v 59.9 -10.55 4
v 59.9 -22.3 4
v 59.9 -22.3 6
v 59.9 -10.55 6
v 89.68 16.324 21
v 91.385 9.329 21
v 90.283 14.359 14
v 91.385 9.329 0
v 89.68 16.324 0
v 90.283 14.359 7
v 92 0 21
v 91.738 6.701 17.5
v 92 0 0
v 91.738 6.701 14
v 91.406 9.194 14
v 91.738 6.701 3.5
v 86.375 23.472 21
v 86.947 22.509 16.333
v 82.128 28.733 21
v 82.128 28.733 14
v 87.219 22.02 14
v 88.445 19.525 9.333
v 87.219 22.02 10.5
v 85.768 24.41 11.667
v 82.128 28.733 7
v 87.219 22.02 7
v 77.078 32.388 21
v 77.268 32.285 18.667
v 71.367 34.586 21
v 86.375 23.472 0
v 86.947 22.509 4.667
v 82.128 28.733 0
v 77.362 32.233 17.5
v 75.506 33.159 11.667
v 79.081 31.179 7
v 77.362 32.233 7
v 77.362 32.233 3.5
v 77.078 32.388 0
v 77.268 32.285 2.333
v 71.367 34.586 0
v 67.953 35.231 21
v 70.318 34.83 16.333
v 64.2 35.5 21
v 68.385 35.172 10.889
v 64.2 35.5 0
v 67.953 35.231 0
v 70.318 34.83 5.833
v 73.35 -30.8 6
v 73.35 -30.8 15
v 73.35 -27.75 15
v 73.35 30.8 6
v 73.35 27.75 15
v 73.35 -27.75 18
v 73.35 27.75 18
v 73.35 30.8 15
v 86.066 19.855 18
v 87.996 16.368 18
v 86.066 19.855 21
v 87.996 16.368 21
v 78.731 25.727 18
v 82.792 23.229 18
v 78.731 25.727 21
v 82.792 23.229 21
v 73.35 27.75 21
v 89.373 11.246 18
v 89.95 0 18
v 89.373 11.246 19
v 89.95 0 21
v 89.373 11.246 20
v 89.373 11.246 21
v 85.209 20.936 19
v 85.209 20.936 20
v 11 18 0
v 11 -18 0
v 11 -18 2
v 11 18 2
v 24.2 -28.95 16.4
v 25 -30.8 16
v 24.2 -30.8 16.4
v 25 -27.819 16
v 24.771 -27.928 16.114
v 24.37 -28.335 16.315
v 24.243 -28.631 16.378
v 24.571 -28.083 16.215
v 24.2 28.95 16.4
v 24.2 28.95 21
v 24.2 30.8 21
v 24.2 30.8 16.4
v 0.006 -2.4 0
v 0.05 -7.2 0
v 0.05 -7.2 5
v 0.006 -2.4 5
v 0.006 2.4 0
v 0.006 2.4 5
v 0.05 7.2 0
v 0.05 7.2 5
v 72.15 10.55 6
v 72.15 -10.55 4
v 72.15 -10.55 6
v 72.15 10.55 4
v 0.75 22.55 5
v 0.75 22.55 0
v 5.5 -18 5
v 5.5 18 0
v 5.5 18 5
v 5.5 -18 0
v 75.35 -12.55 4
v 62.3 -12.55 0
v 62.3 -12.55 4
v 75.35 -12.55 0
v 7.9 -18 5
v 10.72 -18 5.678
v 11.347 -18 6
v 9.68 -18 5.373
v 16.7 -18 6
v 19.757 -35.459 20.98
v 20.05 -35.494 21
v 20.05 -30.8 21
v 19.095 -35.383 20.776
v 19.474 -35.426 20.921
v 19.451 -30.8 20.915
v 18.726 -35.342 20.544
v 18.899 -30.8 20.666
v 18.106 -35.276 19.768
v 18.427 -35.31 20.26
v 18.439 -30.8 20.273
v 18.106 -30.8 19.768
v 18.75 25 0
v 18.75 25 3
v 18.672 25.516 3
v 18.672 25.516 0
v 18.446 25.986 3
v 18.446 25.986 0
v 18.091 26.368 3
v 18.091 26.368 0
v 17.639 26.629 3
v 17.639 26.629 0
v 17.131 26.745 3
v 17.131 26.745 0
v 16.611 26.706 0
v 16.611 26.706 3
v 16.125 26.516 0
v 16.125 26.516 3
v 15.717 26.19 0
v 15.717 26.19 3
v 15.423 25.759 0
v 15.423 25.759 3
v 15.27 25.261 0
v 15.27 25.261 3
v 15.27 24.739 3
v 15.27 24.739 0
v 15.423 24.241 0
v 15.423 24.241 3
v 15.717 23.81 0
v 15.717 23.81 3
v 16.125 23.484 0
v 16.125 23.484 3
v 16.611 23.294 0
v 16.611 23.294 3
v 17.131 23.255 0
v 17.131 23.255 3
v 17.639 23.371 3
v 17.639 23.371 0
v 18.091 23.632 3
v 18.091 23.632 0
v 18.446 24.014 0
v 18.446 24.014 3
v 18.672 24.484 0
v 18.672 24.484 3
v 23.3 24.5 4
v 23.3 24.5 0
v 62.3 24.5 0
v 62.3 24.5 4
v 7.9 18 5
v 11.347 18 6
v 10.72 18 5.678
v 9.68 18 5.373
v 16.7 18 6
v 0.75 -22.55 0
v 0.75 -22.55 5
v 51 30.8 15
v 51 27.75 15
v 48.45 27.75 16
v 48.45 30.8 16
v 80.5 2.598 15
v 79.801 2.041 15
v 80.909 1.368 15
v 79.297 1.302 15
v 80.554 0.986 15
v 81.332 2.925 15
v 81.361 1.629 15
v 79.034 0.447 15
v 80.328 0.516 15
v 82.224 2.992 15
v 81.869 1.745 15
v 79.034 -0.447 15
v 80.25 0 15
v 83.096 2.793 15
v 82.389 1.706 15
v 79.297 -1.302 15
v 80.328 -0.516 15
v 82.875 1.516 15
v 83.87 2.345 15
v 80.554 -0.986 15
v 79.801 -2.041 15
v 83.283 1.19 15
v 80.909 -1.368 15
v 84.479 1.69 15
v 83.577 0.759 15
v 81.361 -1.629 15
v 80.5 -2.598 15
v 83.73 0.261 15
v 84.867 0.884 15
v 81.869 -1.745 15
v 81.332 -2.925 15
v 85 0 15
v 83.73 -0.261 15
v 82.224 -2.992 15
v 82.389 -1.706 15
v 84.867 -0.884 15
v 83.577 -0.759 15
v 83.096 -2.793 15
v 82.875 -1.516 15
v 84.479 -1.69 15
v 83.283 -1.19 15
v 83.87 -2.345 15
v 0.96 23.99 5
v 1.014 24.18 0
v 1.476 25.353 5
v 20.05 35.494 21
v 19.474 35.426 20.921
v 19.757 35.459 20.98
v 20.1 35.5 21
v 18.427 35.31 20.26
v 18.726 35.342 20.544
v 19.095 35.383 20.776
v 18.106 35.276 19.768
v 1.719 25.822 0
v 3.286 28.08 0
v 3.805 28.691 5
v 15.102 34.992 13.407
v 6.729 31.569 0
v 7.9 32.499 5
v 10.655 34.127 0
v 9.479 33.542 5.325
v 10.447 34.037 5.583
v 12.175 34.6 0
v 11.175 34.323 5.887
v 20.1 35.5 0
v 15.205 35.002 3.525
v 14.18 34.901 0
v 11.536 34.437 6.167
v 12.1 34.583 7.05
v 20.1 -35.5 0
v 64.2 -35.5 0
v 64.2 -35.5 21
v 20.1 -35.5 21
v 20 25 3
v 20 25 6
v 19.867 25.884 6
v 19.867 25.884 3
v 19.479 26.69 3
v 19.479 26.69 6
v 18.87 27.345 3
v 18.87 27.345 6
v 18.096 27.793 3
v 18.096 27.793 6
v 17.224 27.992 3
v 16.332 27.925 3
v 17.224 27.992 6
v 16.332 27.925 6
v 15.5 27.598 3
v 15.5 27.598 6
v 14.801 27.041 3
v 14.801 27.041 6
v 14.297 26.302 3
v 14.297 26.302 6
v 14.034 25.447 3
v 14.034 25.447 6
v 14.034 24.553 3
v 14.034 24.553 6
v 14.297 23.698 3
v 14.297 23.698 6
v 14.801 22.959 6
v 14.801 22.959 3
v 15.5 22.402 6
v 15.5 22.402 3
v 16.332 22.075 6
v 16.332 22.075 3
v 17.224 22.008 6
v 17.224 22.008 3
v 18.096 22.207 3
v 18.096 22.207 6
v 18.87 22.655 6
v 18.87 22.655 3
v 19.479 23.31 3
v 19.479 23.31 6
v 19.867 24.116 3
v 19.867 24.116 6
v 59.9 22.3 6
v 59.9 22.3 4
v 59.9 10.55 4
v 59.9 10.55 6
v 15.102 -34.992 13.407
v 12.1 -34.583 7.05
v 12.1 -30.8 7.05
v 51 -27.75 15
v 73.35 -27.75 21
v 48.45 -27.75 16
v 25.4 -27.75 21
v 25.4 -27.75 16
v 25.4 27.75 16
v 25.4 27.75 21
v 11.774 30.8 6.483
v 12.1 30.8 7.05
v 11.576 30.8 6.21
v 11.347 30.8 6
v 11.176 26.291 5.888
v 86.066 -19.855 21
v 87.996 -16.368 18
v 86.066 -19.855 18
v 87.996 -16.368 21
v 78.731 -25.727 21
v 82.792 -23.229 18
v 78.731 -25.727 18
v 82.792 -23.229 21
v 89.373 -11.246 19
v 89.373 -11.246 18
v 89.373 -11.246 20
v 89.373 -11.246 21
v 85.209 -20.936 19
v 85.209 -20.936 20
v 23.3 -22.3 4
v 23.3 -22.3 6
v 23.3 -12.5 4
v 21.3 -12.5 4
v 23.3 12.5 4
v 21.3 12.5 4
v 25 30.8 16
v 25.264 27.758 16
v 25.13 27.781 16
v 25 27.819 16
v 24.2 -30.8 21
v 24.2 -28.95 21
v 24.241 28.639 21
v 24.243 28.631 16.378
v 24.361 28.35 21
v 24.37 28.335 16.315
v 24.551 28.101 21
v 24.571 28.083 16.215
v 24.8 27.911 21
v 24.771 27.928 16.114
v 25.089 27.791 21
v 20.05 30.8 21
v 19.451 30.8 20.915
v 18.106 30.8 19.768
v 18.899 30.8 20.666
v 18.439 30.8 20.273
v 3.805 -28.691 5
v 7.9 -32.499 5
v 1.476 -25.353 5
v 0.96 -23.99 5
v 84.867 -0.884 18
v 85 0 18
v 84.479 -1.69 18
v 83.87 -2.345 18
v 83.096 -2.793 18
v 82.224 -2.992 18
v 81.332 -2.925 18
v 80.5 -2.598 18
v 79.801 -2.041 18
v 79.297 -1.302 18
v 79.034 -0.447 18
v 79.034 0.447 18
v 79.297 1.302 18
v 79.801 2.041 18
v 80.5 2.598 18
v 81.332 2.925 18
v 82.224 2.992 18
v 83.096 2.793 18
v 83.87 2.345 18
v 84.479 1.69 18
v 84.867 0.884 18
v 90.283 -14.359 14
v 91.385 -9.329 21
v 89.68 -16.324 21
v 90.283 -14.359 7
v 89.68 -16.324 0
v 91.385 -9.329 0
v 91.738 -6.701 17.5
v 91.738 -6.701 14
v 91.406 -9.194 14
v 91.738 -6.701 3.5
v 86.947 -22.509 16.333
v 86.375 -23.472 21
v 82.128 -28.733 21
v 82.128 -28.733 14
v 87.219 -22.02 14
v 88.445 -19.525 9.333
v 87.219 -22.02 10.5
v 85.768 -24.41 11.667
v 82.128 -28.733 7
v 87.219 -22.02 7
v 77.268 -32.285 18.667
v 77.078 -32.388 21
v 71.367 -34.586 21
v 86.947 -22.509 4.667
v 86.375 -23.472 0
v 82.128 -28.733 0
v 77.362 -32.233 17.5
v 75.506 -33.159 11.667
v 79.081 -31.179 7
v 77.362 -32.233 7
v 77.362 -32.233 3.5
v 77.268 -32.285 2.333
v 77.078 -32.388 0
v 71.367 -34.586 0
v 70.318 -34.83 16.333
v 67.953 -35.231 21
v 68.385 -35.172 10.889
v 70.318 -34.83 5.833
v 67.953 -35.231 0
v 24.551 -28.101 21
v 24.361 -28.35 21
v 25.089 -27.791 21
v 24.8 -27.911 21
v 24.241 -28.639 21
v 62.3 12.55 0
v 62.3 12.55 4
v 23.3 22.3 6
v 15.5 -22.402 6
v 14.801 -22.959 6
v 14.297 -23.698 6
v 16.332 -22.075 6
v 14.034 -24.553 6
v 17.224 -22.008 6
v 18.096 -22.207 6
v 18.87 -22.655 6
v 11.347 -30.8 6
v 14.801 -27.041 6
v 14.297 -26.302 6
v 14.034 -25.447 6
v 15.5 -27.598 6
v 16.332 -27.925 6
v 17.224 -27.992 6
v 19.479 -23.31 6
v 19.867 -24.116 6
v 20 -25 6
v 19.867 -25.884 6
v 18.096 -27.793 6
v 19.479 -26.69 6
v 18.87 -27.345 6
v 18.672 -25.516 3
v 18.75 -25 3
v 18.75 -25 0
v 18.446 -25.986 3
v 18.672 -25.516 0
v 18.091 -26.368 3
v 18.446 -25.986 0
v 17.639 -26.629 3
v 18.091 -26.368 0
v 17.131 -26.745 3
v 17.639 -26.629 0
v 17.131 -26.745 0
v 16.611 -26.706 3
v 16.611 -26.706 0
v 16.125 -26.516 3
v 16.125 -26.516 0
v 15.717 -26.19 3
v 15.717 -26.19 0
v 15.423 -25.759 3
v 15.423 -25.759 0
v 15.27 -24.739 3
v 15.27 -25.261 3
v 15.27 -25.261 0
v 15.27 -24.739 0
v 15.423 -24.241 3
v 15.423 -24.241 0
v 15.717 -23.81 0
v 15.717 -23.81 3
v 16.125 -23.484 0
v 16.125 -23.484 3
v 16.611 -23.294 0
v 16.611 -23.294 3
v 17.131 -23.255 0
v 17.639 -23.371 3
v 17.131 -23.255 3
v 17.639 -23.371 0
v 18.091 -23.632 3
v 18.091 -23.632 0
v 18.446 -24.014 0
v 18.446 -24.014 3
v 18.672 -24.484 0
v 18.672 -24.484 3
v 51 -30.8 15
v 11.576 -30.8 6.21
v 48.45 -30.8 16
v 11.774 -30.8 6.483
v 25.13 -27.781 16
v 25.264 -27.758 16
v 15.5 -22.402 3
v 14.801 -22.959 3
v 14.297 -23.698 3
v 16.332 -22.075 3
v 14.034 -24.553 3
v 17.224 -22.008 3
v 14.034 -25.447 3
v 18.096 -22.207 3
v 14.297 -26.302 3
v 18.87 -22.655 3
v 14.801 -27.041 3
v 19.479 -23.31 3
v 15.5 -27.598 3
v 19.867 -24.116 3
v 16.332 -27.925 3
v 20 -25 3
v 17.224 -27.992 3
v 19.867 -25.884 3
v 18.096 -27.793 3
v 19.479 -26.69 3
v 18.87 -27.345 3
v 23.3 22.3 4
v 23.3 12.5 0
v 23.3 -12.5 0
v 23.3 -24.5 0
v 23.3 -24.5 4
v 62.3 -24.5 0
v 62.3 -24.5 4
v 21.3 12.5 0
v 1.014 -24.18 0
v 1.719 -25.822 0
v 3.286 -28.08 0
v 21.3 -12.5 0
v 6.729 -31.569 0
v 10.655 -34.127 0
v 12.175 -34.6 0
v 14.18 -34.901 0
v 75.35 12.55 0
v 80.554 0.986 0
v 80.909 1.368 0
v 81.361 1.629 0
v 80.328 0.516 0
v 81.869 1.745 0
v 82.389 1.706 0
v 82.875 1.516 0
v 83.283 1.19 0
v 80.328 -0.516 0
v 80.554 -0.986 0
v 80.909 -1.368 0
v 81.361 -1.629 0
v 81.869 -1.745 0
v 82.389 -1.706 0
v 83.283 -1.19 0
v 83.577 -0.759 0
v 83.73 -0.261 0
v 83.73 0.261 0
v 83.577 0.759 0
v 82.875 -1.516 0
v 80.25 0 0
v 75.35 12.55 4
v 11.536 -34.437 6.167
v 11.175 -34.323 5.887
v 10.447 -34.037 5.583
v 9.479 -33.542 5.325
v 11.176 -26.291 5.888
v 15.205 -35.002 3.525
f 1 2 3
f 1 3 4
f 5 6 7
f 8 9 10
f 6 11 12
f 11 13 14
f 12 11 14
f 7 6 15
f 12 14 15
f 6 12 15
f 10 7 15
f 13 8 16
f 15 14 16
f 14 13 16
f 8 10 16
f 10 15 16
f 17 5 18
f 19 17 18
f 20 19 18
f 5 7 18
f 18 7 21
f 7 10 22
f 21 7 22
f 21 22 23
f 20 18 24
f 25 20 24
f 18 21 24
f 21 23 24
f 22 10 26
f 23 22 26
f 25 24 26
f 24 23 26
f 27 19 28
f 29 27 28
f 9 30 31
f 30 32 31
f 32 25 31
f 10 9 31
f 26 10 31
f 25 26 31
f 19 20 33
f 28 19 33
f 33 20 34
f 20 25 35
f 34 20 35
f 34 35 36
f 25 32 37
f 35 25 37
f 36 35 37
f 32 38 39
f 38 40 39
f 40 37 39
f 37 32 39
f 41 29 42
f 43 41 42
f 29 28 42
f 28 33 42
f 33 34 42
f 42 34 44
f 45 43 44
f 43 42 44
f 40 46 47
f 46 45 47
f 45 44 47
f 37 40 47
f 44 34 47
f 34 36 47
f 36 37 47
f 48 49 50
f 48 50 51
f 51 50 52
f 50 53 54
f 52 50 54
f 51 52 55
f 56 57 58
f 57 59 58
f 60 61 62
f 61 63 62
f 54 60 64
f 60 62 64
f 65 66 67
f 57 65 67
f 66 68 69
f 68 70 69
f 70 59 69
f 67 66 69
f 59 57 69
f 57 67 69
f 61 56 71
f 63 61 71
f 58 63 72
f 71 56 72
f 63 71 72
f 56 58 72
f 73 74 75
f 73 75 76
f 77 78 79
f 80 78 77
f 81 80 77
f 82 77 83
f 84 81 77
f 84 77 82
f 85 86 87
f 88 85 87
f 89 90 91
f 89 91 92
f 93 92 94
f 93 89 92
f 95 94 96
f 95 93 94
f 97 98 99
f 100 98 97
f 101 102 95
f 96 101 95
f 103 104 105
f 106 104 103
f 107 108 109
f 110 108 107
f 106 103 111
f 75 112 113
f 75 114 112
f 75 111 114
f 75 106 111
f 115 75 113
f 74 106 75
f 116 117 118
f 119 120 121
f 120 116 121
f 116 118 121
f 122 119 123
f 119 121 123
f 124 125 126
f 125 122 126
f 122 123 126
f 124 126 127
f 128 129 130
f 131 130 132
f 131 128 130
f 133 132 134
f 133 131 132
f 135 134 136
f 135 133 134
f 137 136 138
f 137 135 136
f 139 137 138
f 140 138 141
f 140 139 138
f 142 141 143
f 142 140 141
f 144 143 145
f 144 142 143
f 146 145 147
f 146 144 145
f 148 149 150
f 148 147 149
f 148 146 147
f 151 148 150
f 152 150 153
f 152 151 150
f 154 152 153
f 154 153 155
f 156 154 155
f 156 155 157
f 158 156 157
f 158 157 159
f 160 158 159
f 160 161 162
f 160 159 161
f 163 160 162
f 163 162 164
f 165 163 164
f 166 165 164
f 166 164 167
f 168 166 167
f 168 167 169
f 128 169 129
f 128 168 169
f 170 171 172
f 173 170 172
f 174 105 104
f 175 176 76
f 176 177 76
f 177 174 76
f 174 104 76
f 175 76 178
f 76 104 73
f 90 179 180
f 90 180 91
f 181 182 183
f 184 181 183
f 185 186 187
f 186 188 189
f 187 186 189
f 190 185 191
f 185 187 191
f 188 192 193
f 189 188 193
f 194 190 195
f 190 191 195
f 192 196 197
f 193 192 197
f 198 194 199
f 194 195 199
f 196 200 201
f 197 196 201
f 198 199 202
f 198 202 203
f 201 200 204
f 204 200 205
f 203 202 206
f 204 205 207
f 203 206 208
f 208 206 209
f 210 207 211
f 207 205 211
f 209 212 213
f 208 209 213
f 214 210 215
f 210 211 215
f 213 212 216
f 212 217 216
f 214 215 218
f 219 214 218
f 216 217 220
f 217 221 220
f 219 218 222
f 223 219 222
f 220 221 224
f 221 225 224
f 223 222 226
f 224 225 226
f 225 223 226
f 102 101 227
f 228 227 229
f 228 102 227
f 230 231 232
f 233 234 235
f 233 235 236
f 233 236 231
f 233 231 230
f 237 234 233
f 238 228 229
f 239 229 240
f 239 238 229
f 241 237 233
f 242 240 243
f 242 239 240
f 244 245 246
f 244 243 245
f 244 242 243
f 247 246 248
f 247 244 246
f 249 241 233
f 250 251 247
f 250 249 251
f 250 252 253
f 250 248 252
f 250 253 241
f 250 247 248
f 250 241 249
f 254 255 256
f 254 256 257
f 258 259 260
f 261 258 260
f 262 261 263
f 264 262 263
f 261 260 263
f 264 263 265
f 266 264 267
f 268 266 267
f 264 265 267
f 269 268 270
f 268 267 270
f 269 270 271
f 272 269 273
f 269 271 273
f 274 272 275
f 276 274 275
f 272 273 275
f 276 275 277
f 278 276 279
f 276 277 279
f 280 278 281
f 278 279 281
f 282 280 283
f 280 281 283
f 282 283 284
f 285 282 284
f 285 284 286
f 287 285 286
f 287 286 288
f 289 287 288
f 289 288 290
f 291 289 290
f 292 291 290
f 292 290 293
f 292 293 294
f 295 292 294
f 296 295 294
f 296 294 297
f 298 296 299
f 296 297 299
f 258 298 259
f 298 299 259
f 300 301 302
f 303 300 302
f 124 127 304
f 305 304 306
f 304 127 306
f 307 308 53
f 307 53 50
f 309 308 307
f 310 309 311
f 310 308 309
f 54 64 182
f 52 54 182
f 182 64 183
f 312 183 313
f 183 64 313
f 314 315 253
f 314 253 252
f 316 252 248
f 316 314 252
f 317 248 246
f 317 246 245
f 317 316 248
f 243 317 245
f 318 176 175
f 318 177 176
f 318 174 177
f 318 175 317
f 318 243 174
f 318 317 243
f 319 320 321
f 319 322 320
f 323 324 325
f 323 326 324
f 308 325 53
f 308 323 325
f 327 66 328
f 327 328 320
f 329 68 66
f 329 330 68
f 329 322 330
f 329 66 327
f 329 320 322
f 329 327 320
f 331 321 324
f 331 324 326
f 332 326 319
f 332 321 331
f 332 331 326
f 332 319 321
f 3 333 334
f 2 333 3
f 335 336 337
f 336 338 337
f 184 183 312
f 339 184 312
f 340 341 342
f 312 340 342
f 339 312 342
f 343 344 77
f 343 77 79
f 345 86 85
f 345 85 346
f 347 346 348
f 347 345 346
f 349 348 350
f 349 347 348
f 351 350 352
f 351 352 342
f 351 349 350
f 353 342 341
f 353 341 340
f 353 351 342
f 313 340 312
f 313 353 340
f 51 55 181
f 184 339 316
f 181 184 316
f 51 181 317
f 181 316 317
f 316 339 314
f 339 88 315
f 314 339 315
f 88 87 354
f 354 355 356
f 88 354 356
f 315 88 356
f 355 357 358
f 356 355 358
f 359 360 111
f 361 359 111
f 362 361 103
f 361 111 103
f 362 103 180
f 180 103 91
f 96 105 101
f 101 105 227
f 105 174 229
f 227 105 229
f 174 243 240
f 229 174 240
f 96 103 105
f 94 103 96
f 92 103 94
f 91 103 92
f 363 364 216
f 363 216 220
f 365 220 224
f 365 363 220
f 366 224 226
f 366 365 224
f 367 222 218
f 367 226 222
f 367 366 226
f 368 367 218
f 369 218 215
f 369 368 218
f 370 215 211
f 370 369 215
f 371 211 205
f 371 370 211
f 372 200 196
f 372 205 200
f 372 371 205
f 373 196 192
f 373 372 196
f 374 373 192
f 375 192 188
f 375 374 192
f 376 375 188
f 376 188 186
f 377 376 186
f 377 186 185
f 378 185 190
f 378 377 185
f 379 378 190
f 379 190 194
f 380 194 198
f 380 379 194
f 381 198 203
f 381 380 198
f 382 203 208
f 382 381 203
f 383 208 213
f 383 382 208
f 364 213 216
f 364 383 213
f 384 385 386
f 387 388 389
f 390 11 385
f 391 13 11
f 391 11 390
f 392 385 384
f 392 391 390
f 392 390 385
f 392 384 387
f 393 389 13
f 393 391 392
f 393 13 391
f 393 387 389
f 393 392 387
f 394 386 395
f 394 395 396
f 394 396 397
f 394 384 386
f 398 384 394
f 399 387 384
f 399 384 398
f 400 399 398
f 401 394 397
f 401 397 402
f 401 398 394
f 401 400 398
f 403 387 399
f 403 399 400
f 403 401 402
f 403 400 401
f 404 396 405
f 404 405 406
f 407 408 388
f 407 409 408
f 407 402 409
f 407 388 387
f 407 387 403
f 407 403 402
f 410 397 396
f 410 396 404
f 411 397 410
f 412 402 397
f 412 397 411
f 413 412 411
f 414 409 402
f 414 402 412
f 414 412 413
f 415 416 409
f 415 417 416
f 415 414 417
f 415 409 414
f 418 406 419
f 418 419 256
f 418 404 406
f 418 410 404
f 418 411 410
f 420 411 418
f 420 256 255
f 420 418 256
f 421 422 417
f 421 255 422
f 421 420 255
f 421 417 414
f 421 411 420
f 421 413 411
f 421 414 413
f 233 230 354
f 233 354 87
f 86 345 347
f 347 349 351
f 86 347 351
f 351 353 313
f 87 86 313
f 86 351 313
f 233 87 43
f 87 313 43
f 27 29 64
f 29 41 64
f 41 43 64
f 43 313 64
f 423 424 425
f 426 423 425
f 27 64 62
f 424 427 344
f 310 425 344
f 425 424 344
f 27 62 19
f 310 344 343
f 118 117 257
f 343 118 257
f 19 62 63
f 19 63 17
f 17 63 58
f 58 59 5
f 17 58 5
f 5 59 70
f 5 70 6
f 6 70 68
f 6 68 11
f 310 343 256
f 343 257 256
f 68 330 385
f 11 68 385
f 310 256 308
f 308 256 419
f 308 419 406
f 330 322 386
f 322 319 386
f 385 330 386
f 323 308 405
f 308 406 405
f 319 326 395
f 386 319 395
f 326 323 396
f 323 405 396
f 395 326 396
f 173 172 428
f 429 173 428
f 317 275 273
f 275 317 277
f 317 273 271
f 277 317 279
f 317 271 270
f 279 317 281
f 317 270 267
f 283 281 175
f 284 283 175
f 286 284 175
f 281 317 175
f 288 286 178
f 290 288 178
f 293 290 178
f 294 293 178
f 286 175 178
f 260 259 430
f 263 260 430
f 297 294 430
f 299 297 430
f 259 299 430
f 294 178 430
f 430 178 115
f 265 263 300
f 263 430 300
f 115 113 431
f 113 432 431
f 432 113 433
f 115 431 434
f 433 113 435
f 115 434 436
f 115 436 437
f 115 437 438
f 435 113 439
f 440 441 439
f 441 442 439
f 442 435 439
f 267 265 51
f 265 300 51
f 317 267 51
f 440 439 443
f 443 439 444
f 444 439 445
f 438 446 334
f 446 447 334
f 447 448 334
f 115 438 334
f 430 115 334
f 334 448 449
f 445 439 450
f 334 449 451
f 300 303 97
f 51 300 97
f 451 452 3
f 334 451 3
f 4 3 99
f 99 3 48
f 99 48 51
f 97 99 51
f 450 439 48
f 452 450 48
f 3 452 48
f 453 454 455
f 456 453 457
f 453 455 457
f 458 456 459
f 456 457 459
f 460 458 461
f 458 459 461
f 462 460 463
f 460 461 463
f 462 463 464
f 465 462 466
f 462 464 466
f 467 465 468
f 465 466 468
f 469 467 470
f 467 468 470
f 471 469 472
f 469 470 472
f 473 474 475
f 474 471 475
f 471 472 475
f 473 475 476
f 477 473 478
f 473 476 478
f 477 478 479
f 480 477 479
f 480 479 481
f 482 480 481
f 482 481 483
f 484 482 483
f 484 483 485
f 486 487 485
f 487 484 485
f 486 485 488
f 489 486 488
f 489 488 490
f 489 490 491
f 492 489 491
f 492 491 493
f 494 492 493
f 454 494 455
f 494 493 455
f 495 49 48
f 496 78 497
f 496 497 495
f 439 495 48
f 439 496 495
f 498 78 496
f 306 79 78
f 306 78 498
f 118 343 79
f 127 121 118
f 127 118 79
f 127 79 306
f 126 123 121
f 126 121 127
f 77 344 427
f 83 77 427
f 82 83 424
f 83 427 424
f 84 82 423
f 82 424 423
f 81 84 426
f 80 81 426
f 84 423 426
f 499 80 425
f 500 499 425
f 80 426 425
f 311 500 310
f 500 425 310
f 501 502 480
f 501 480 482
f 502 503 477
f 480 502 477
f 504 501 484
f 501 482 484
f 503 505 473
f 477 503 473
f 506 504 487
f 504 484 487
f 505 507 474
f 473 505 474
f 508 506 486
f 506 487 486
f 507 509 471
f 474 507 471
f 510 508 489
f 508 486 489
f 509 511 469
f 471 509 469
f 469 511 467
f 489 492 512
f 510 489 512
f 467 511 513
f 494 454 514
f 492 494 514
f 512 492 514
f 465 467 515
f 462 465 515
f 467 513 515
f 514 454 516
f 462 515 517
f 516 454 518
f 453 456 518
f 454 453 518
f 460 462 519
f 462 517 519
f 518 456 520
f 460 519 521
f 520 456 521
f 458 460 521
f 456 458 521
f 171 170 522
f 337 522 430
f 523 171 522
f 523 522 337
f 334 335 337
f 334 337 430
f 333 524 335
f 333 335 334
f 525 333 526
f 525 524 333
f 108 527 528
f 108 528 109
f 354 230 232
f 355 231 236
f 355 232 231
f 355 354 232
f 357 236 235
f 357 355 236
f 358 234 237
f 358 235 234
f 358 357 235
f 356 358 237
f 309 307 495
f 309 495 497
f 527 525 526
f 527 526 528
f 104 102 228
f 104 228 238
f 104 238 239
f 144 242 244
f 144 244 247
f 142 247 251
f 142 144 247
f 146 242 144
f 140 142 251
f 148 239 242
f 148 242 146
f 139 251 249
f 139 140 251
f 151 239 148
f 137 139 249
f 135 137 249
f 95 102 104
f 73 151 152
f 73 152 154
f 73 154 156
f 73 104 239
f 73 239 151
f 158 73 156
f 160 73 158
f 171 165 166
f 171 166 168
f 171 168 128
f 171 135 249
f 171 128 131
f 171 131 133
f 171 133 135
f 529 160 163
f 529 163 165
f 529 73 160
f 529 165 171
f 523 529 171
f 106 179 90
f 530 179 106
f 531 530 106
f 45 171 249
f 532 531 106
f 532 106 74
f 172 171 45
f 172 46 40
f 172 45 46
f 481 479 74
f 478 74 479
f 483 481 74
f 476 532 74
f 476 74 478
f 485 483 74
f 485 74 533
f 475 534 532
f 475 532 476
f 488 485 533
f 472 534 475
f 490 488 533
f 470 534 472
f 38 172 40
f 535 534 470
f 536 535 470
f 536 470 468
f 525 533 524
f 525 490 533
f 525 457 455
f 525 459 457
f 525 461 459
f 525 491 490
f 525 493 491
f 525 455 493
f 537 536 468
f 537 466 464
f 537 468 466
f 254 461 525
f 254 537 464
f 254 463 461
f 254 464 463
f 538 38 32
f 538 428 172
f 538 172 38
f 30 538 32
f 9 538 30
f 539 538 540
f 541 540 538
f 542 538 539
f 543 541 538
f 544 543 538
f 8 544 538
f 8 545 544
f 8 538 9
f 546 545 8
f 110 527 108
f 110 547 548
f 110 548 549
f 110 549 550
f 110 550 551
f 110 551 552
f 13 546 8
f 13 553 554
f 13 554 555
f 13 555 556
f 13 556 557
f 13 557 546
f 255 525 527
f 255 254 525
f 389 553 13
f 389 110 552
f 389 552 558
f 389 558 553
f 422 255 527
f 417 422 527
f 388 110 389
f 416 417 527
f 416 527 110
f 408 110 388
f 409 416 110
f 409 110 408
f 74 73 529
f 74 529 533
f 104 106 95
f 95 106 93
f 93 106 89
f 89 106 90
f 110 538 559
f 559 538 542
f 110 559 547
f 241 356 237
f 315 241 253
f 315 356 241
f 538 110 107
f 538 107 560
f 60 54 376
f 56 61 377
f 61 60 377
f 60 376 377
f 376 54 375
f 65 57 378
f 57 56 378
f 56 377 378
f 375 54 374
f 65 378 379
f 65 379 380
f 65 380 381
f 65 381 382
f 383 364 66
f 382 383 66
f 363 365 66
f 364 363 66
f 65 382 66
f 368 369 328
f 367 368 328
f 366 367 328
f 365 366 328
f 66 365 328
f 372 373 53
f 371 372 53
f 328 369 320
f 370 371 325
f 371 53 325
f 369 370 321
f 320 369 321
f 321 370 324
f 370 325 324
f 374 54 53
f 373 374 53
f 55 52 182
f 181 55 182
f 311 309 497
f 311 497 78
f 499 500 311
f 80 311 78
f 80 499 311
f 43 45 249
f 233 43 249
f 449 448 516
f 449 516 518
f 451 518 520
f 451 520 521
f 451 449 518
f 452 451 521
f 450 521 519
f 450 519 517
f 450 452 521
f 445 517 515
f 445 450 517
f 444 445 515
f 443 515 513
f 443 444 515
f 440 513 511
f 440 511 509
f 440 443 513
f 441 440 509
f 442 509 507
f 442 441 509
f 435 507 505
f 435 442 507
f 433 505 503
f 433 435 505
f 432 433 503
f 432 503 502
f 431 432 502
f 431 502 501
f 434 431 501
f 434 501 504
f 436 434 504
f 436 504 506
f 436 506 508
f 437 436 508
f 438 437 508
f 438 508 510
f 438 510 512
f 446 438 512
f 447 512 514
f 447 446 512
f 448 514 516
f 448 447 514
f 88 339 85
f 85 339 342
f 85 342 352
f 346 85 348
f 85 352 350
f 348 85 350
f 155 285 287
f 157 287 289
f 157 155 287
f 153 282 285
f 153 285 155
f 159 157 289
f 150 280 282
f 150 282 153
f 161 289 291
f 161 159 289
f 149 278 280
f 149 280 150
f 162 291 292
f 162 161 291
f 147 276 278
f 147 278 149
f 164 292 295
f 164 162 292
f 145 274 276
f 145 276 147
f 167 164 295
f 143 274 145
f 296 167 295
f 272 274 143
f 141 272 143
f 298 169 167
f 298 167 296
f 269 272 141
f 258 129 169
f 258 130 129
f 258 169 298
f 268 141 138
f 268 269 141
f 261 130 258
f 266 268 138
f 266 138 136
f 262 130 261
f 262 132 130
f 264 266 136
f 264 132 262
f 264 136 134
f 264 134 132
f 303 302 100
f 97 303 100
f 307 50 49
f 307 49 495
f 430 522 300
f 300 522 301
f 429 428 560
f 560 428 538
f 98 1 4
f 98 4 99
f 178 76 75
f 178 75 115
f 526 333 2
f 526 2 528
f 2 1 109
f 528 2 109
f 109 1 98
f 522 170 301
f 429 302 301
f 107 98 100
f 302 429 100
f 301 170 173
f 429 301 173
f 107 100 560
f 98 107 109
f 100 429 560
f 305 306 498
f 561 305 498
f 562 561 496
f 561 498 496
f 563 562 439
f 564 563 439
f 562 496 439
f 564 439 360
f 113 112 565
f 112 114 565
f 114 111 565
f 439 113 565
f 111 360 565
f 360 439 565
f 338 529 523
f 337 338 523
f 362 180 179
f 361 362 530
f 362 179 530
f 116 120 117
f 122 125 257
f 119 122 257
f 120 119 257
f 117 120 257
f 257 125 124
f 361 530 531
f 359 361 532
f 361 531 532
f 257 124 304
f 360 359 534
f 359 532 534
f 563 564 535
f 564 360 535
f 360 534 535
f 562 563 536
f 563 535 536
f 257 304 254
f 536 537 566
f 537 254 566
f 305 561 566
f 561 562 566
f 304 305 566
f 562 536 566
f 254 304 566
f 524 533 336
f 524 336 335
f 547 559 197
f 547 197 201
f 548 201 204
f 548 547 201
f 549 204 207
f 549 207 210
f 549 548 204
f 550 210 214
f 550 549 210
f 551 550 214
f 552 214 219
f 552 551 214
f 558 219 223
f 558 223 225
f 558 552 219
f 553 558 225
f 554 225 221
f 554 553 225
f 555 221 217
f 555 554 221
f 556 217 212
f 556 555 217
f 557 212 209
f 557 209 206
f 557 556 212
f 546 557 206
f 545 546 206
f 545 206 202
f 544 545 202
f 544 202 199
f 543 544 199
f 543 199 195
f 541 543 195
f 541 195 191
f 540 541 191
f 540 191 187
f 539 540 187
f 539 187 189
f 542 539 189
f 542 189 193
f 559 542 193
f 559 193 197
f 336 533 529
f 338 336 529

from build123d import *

# Parameters (mm, degrees)
SKETCH009_R     = 1.75
PAD001_DEPTH    = 21
POCKET008_DEPTH = 35.5010001
POCKET009_DEPTH = 15
POCKET010_DEPTH = 18
SKETCH013_W     = 2
SKETCH013_H     = 12.5
POCKET011_DEPTH = 4
POCKET012_DEPTH = 3
POCKET013_DEPTH = 3.05
POCKET017_DEPTH = 3
SKETCH021_R     = 3
POCKET018_DEPTH = 3


with BuildPart() as part:
    # Sketch009 → Pad001 (new body)
    with BuildSketch(Plane.XY):
        with BuildLine():
            Line((11, 0), (23.3, 0))
            Line((23.3, 0), (23.3, 22.3))
            Line((23.3, 22.3), (59.9, 22.3))
            Line((59.9, 22.3), (59.9, 10.55))
            Line((59.9, 10.55), (72.15, 10.55))
            Line((72.15, 10.55), (72.15, 0))
            Line((72.15, 0), (80.25, 0))
            ThreePointArc((80.25, 0), (82, 1.75), (83.75, 0))
            Line((83.75, 0), (92, 0))
            add(Edge.make_bspline(
                [(92, 0), (92.391037, 11.810127), (88.126587, 35.076866), (64.2, 35.5)],
                knots=[0, 0, 0, 0, 1, 1, 1, 1], degree=3))
            Line((64.2, 35.5), (20.1, 35.5))
            add(Edge.make_bspline(
                [(0.75, 22.55), (0.790433, 24.50555), (2.8995135699, 28.3383927733), (10.6468681476, 35.231617337), (14.5053016695, 34.8194742751), (20.1, 35.5)],
                knots=[0, 0, 0, 0, 0.3333333333, 0.6666666667, 1, 1, 1, 1], degree=3))
            Line((0.75, 22.55), (0.05, 7.2))
            ThreePointArc((0.05, 7.2), (0.0125001507, 3.6000868045), (0, 0))
            Line((0, 0), (5.5, 0))
            Line((5.5, 0), (5.5, 18))
            Line((5.5, 18), (11, 18))
            Line((11, 18), (11, 0))
        make_face()
        with Locations((17, 25)):
            Circle(SKETCH009_R, mode=Mode.SUBTRACT)
    extrude(amount=PAD001_DEPTH)

    # Sketch010 (on Face1 of Pad001) → Pocket008 (cut, through all)
    with BuildSketch(Plane.XZ):
        with BuildLine():
            Line((7.9, 5), (0, 5))
            Line((0, 5), (0, 21))
            Line((0, 21), (20.05, 21))
            ThreePointArc((20.05, 21), (18.8992105015, 20.6660901767), (18.1058720895, 19.7680777024))
            Line((18.1058720895, 19.7680777024), (12.1, 7.05))
            add(Edge.make_bspline(
                [(12.1, 7.05), (11.7904723155, 6.5431449633), (11.5915441331, 5.8310211118), (9.732416, 5.34755), (7.9, 5)],
                knots=[0, 0, 0, 0, 0.5, 1, 1, 1, 1], degree=3))
        make_face()
    extrude(amount=-POCKET008_DEPTH, mode=Mode.SUBTRACT)

    # Sketch011 (on Face4 of Pocket008) → Pocket009 (cut)
    with BuildSketch(Plane.XY.offset(21)):
        with BuildLine():
            Line((11, 30.8), (11, 0))
            Line((11, 0), (23.3, 0))
            Line((23.3, 0), (23.3, 22.3))
            Line((23.3, 22.3), (59.9, 22.3))
            Line((59.9, 22.3), (59.9, 10.55))
            Line((59.9, 10.55), (72.15, 10.55))
            Line((72.15, 10.55), (72.15, 0))
            Line((72.15, 0), (73.35, 0))
            Line((73.35, 27.75), (73.35, 0))
            Line((73.35, 27.75), (25.4, 27.75))
            ThreePointArc((24.2, 28.95), (24.5514718626, 28.1014718626), (25.4, 27.75))
            Line((24.2, 28.95), (24.2, 30.8))
            Line((24.2, 30.8), (11, 30.8))
        make_face()
    extrude(amount=-POCKET009_DEPTH, mode=Mode.SUBTRACT)

    # Sketch012 (on Face1 of Pocket009) → Pocket010 (cut)
    with BuildSketch(Plane.XZ):
        Polygon((16.7, 6), (11, 6), (11, 2), align=None)
    extrude(amount=-POCKET010_DEPTH, mode=Mode.SUBTRACT)

    # Sketch013 (on Face2 of Pocket010) → Pocket011 (cut)
    with BuildSketch(Plane(origin=(0, 0, 0), x_dir=(1, 0, 0), z_dir=(0, 0, -1))):
        Polygon((72.15, -10.55), (59.9, -10.55), (59.9, -22.3), (23.3, -22.3), (23.3, -24.5), (62.3, -24.5), (62.3, -12.55), (75.35, -12.55), (75.35, 0), (72.15, 0), align=None)
        with Locations((22.3, -6.25)):
            Rectangle(SKETCH013_W, SKETCH013_H)
    extrude(amount=-POCKET011_DEPTH, mode=Mode.SUBTRACT)

    # Sketch014 (on Face36 of Pocket011) → Pocket012 (cut)
    with BuildSketch(Plane.XY.offset(21)):
        with BuildLine():
            Line((73.35, 27.75), (73.35, 0))
            Line((73.35, 0), (89.95, 0))
            add(Edge.make_bspline(
                [(89.95, 0), (89.796112, 11.583797), (90.425743, 22.81332), (73.35, 27.75)],
                knots=[0, 0, 0, 0, 1, 1, 1, 1], degree=3))
        make_face()
    extrude(amount=-POCKET012_DEPTH, mode=Mode.SUBTRACT)

    # Sketch015 (on Face29 of Pocket012) → Pocket013 (cut)
    with BuildSketch(Plane.XZ.offset(-27.75)):
        Polygon((24.2, 6), (73.35, 6), (73.35, 15), (51, 15), (48.45, 16), (25, 16), (24.2, 16.4), align=None)
    extrude(amount=-POCKET013_DEPTH, mode=Mode.SUBTRACT)

    # Sketch020 (on Face36 of Pocket013) → Pocket017 (cut)
    with BuildSketch(Plane.XY.offset(18)):
        with BuildLine():
            ThreePointArc((85, 0), (82, 3), (79, 0))
            Line((79, 0), (85, 0))
        make_face()
    extrude(amount=-POCKET017_DEPTH, mode=Mode.SUBTRACT)

    # Sketch021 (on Face6 of Pocket017) → Pocket018 (cut)
    with BuildSketch(Plane.XY.offset(6)):
        with Locations((17, 25)):
            Circle(SKETCH021_R)
    extrude(amount=-POCKET018_DEPTH, mode=Mode.SUBTRACT)

    # Mirrored: part across XZ


with BuildPart() as part_1:
    add(part.part)
    add(part.part.mirror(Plane.XZ))


solid = part_1.part
